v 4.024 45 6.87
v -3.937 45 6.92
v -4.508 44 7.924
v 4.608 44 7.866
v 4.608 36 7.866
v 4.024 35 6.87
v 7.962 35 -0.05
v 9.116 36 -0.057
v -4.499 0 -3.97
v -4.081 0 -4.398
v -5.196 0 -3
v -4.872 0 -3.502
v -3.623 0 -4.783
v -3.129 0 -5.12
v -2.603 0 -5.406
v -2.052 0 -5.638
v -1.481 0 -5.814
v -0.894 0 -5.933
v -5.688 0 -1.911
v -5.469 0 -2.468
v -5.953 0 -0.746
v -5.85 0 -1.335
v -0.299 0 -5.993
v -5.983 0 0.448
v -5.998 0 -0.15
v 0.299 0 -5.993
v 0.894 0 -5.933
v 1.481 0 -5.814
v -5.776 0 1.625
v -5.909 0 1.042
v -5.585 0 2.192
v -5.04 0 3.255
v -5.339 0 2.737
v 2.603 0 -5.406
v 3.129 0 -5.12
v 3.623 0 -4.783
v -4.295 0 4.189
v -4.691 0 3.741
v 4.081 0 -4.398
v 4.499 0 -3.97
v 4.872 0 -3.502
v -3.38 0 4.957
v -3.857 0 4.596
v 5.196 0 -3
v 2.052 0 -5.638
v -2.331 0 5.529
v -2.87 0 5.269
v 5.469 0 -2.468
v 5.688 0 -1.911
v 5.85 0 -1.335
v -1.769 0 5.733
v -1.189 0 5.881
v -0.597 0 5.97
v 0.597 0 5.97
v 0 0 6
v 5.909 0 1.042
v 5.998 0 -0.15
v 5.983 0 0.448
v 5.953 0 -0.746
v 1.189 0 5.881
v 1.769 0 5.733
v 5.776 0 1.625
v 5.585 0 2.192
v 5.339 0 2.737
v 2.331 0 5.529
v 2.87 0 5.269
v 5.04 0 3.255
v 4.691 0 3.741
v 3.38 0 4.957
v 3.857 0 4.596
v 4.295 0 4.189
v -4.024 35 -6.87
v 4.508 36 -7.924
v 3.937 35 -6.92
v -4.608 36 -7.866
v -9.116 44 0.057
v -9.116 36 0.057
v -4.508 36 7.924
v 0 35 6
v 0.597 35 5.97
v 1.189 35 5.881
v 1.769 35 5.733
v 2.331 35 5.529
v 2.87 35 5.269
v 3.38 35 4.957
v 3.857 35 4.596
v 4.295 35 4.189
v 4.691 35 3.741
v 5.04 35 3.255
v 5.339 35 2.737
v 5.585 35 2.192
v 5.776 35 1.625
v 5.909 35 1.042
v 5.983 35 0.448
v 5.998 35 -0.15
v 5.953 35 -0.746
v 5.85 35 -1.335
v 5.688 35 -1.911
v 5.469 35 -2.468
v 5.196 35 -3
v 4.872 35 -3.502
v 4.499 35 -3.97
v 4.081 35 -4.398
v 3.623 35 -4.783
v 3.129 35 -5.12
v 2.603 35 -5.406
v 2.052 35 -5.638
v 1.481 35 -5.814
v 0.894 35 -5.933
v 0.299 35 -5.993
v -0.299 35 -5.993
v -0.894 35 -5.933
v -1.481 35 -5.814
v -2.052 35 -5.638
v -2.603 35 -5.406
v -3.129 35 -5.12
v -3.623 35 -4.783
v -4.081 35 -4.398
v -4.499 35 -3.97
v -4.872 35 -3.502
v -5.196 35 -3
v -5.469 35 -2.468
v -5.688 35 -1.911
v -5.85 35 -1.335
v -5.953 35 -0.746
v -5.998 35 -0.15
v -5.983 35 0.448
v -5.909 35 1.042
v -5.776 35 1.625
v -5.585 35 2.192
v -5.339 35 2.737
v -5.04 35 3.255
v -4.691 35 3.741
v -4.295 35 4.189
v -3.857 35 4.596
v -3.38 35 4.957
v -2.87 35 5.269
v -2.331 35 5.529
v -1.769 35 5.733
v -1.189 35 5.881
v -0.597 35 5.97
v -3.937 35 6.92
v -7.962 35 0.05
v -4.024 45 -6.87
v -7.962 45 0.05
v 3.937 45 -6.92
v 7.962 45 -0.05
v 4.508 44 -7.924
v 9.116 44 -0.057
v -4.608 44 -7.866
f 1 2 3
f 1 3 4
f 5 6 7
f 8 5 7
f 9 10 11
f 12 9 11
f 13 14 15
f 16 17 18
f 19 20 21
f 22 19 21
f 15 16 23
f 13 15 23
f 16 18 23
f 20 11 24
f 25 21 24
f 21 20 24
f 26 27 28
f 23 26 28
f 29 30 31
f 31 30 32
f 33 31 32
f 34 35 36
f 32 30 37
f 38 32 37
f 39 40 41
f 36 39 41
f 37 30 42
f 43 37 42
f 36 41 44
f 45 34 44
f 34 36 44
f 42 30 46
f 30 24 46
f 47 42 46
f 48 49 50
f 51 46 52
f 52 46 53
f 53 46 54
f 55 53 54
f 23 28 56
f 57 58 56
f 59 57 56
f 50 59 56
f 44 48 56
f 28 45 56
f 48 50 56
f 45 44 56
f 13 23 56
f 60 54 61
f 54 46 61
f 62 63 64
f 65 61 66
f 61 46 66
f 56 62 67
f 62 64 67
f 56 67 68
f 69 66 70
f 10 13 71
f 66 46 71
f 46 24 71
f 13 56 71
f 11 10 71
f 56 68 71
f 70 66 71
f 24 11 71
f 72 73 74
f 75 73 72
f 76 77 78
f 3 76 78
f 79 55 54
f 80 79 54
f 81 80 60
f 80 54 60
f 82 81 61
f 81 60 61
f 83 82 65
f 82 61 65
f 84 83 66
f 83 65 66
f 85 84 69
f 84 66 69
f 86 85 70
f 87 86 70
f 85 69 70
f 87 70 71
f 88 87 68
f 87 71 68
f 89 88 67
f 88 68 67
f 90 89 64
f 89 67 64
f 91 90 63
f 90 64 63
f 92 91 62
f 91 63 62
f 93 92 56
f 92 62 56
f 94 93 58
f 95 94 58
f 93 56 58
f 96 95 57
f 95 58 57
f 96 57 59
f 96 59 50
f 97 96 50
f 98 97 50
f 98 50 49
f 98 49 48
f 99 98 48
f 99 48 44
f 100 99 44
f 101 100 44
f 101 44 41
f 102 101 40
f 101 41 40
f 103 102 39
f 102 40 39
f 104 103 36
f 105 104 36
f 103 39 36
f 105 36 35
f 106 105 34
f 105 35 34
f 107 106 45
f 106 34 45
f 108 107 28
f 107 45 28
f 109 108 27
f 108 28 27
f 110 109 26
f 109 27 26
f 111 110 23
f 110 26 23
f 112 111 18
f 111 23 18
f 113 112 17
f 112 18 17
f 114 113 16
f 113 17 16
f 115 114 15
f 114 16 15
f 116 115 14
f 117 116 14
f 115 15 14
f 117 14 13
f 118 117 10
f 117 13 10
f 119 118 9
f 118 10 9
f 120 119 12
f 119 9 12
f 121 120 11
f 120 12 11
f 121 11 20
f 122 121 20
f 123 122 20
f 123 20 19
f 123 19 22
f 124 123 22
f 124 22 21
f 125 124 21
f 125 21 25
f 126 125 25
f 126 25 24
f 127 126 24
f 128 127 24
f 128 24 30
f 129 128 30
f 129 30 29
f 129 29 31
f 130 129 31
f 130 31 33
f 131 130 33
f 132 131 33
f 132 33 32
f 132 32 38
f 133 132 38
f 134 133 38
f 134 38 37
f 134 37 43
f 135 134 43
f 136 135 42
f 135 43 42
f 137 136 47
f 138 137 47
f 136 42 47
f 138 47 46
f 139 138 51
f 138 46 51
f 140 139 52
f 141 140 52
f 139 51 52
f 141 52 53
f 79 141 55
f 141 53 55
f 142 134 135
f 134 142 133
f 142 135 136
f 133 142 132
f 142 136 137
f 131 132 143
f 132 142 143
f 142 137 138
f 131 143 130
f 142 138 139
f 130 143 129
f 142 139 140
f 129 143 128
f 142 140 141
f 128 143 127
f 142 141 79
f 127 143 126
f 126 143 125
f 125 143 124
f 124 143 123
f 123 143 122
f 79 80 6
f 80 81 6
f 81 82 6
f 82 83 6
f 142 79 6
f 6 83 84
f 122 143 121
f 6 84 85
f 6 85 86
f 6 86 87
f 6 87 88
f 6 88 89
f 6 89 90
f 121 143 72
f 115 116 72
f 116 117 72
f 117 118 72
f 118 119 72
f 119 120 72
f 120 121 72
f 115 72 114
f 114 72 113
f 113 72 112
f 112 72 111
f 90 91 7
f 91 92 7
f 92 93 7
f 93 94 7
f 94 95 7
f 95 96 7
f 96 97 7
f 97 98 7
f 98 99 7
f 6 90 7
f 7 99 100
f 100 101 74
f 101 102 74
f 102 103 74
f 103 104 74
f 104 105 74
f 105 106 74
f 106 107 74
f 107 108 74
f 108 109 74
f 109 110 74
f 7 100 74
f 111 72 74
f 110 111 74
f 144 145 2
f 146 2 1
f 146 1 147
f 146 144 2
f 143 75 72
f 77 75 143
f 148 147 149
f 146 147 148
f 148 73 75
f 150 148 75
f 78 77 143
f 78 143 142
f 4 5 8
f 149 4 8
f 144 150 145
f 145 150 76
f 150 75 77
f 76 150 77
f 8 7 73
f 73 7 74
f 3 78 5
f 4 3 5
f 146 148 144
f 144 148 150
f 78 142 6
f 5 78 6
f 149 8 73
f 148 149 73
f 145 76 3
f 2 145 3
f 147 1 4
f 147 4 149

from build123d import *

# Parameters (mm, degrees)
CROQUIS2_R              = 6
SALIENTE_EXTRUIR1_DEPTH = 35
SALIENTE_EXTRUIR2_DEPTH = 10
CHAFL_N1_SIZE           = 1


with BuildPart() as part:
    # Croquis2 → Saliente-Extruir1 (new body)
    with BuildSketch(Plane(origin=(0, 0, 0), x_dir=(1, 0, 0), z_dir=(0, 1, 0))):
        with Locations(Location((0, 0, 0), (0, 0, 270))):
            Circle(CROQUIS2_R)
    extrude(amount=SALIENTE_EXTRUIR1_DEPTH)

    # Croquis3 → Saliente-Extruir2 (add)
    with BuildSketch(Plane(origin=(0, 35, 0), x_dir=(1, 0, 0), z_dir=(0, 1, 0))):
        Polygon((4.607833062, -7.866269978), (9.116306165, 0.057365499), (4.508473103, 7.923635477), (-4.607833062, 7.866269978), (-9.116306165, -0.057365499), (-4.508473103, -7.923635477), align=None)
    extrude(amount=SALIENTE_EXTRUIR2_DEPTH)

    # Chaflán1
    chafl_n1_edges = [part.edges().sort_by_distance(p)[0] for p in [
        (0.04967998, 35, 7.894952727),
        (6.862069613, 35, 3.904452239),
        (6.812389634, 35, -3.990500488),
        (-0.04967998, 35, -7.894952727),
        (-6.862069613, 35, -3.904452239),
        (-6.812389634, 35, 3.990500488),
        (0.04967998, 45, 7.894952727),
        (6.862069613, 45, 3.904452239),
        (6.812389634, 45, -3.990500488),
        (-0.04967998, 45, -7.894952727),
        (-6.862069613, 45, -3.904452239),
        (-6.812389634, 45, 3.990500488),
    ]]
    chamfer(chafl_n1_edges, length=CHAFL_N1_SIZE)


solid = part.part
